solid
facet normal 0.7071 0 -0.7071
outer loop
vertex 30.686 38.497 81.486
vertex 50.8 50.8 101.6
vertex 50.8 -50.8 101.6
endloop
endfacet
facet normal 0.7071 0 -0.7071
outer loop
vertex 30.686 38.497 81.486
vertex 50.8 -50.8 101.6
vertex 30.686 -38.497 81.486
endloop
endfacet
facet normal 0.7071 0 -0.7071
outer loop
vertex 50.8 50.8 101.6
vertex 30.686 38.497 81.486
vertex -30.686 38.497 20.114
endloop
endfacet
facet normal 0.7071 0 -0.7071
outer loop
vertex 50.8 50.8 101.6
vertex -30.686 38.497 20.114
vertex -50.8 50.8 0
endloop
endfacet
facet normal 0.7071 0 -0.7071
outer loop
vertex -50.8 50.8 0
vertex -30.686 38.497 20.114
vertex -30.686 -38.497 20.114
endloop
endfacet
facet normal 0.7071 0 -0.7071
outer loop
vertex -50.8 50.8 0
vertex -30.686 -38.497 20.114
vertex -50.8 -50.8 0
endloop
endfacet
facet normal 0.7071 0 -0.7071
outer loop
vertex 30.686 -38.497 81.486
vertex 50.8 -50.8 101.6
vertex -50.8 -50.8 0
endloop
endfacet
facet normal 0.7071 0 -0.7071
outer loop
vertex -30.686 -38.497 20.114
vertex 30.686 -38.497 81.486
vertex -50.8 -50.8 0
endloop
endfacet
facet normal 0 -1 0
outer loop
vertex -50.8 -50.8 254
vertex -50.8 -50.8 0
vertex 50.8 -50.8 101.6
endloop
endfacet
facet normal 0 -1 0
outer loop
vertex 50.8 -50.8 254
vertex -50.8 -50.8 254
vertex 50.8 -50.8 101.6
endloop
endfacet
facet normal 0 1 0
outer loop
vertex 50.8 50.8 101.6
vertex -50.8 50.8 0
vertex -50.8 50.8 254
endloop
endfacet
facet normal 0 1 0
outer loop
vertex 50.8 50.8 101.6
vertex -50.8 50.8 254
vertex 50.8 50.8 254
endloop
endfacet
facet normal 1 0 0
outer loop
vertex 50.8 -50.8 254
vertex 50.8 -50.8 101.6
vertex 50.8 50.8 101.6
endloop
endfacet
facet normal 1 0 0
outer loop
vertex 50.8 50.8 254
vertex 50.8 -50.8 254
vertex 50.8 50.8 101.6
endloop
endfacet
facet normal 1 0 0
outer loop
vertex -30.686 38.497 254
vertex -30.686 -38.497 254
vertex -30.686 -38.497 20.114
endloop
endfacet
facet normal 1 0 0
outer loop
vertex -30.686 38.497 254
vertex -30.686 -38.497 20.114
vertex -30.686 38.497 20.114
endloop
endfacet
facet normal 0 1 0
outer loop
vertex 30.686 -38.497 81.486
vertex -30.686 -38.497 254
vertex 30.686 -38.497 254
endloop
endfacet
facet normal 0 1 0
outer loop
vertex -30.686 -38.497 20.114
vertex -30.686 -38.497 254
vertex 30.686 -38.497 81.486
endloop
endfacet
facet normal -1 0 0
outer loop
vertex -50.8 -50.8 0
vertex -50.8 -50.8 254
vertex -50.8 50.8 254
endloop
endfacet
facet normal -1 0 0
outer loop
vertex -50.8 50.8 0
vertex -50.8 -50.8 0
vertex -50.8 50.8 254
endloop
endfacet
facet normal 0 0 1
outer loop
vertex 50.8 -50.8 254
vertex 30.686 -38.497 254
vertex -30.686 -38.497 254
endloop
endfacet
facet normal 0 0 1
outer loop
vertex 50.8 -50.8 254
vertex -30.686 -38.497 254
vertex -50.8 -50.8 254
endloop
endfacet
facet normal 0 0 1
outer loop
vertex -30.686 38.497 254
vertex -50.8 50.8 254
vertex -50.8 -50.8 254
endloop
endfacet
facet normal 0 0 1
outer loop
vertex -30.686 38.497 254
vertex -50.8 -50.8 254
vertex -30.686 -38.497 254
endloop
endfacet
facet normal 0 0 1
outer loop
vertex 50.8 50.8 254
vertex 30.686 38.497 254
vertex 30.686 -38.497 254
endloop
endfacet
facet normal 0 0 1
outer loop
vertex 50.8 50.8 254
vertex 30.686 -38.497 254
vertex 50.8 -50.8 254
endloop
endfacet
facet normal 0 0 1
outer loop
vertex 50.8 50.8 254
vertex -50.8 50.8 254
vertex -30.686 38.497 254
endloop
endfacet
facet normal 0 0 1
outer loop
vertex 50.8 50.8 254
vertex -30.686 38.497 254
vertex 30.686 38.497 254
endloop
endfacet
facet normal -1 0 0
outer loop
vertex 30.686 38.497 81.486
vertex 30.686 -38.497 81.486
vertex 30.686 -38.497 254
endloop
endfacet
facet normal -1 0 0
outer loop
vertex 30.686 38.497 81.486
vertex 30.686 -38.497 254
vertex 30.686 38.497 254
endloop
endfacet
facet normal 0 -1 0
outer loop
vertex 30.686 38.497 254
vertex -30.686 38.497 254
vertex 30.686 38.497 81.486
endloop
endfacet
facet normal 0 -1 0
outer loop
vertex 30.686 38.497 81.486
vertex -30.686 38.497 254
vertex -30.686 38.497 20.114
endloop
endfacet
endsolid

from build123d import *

# Parameters (mm, degrees)
F0_W      = 50.8
F0_H      = 50.8
F0_W_2    = 47.625
F0_H_2    = 47.625
F1_DEPTH  = 508
F3_DEPTH  = 50.801
F5_DEPTH  = 50.801
F7_W      = 101.6
F7_H      = 101.6
F7_W_2    = 61.3725754684
F7_H_2    = 76.9944727293
F8_DEPTH  = 254
F10_DEPTH = 101.601


with BuildPart() as f1:
    # F0 (on Top) → F1 (new body)
    with BuildSketch(Plane.XY):
        Rectangle(F0_W, F0_H)
        Rectangle(F0_W_2, F0_H_2, mode=Mode.SUBTRACT)
    extrude(amount=F1_DEPTH)

    # F2 (on face) → F3 (cut, through all)
    with BuildSketch(Plane.XZ.offset(25.4)):
        Polygon((25.4, 46.0020601749), (-25.4, 0), (25.4, 0), align=None)
    extrude(amount=-F3_DEPTH, mode=Mode.SUBTRACT)

    # F4 (on face) → F5 (cut, through all)
    with BuildSketch(Plane.XZ.offset(25.4)):
        Polygon((25.4, 508), (-25.4, 508), (25.4, 469.4332480431), align=None)
    extrude(amount=-F5_DEPTH, mode=Mode.SUBTRACT)


with BuildPart() as f8:
    # F7 (on Top) → F8 (new body)
    with BuildSketch(Plane.XY):
        Rectangle(F7_W, F7_H)
        Rectangle(F7_W_2, F7_H_2, mode=Mode.SUBTRACT)
    extrude(amount=F8_DEPTH)

    # F9 (on face) → F10 (cut, through all)
    with BuildSketch(Plane.XZ.offset(50.8)):
        Polygon((50.8, 101.6), (-50.8, 0), (50.8, 0), align=None)
    extrude(amount=-F10_DEPTH, mode=Mode.SUBTRACT)


solid = f8.part
